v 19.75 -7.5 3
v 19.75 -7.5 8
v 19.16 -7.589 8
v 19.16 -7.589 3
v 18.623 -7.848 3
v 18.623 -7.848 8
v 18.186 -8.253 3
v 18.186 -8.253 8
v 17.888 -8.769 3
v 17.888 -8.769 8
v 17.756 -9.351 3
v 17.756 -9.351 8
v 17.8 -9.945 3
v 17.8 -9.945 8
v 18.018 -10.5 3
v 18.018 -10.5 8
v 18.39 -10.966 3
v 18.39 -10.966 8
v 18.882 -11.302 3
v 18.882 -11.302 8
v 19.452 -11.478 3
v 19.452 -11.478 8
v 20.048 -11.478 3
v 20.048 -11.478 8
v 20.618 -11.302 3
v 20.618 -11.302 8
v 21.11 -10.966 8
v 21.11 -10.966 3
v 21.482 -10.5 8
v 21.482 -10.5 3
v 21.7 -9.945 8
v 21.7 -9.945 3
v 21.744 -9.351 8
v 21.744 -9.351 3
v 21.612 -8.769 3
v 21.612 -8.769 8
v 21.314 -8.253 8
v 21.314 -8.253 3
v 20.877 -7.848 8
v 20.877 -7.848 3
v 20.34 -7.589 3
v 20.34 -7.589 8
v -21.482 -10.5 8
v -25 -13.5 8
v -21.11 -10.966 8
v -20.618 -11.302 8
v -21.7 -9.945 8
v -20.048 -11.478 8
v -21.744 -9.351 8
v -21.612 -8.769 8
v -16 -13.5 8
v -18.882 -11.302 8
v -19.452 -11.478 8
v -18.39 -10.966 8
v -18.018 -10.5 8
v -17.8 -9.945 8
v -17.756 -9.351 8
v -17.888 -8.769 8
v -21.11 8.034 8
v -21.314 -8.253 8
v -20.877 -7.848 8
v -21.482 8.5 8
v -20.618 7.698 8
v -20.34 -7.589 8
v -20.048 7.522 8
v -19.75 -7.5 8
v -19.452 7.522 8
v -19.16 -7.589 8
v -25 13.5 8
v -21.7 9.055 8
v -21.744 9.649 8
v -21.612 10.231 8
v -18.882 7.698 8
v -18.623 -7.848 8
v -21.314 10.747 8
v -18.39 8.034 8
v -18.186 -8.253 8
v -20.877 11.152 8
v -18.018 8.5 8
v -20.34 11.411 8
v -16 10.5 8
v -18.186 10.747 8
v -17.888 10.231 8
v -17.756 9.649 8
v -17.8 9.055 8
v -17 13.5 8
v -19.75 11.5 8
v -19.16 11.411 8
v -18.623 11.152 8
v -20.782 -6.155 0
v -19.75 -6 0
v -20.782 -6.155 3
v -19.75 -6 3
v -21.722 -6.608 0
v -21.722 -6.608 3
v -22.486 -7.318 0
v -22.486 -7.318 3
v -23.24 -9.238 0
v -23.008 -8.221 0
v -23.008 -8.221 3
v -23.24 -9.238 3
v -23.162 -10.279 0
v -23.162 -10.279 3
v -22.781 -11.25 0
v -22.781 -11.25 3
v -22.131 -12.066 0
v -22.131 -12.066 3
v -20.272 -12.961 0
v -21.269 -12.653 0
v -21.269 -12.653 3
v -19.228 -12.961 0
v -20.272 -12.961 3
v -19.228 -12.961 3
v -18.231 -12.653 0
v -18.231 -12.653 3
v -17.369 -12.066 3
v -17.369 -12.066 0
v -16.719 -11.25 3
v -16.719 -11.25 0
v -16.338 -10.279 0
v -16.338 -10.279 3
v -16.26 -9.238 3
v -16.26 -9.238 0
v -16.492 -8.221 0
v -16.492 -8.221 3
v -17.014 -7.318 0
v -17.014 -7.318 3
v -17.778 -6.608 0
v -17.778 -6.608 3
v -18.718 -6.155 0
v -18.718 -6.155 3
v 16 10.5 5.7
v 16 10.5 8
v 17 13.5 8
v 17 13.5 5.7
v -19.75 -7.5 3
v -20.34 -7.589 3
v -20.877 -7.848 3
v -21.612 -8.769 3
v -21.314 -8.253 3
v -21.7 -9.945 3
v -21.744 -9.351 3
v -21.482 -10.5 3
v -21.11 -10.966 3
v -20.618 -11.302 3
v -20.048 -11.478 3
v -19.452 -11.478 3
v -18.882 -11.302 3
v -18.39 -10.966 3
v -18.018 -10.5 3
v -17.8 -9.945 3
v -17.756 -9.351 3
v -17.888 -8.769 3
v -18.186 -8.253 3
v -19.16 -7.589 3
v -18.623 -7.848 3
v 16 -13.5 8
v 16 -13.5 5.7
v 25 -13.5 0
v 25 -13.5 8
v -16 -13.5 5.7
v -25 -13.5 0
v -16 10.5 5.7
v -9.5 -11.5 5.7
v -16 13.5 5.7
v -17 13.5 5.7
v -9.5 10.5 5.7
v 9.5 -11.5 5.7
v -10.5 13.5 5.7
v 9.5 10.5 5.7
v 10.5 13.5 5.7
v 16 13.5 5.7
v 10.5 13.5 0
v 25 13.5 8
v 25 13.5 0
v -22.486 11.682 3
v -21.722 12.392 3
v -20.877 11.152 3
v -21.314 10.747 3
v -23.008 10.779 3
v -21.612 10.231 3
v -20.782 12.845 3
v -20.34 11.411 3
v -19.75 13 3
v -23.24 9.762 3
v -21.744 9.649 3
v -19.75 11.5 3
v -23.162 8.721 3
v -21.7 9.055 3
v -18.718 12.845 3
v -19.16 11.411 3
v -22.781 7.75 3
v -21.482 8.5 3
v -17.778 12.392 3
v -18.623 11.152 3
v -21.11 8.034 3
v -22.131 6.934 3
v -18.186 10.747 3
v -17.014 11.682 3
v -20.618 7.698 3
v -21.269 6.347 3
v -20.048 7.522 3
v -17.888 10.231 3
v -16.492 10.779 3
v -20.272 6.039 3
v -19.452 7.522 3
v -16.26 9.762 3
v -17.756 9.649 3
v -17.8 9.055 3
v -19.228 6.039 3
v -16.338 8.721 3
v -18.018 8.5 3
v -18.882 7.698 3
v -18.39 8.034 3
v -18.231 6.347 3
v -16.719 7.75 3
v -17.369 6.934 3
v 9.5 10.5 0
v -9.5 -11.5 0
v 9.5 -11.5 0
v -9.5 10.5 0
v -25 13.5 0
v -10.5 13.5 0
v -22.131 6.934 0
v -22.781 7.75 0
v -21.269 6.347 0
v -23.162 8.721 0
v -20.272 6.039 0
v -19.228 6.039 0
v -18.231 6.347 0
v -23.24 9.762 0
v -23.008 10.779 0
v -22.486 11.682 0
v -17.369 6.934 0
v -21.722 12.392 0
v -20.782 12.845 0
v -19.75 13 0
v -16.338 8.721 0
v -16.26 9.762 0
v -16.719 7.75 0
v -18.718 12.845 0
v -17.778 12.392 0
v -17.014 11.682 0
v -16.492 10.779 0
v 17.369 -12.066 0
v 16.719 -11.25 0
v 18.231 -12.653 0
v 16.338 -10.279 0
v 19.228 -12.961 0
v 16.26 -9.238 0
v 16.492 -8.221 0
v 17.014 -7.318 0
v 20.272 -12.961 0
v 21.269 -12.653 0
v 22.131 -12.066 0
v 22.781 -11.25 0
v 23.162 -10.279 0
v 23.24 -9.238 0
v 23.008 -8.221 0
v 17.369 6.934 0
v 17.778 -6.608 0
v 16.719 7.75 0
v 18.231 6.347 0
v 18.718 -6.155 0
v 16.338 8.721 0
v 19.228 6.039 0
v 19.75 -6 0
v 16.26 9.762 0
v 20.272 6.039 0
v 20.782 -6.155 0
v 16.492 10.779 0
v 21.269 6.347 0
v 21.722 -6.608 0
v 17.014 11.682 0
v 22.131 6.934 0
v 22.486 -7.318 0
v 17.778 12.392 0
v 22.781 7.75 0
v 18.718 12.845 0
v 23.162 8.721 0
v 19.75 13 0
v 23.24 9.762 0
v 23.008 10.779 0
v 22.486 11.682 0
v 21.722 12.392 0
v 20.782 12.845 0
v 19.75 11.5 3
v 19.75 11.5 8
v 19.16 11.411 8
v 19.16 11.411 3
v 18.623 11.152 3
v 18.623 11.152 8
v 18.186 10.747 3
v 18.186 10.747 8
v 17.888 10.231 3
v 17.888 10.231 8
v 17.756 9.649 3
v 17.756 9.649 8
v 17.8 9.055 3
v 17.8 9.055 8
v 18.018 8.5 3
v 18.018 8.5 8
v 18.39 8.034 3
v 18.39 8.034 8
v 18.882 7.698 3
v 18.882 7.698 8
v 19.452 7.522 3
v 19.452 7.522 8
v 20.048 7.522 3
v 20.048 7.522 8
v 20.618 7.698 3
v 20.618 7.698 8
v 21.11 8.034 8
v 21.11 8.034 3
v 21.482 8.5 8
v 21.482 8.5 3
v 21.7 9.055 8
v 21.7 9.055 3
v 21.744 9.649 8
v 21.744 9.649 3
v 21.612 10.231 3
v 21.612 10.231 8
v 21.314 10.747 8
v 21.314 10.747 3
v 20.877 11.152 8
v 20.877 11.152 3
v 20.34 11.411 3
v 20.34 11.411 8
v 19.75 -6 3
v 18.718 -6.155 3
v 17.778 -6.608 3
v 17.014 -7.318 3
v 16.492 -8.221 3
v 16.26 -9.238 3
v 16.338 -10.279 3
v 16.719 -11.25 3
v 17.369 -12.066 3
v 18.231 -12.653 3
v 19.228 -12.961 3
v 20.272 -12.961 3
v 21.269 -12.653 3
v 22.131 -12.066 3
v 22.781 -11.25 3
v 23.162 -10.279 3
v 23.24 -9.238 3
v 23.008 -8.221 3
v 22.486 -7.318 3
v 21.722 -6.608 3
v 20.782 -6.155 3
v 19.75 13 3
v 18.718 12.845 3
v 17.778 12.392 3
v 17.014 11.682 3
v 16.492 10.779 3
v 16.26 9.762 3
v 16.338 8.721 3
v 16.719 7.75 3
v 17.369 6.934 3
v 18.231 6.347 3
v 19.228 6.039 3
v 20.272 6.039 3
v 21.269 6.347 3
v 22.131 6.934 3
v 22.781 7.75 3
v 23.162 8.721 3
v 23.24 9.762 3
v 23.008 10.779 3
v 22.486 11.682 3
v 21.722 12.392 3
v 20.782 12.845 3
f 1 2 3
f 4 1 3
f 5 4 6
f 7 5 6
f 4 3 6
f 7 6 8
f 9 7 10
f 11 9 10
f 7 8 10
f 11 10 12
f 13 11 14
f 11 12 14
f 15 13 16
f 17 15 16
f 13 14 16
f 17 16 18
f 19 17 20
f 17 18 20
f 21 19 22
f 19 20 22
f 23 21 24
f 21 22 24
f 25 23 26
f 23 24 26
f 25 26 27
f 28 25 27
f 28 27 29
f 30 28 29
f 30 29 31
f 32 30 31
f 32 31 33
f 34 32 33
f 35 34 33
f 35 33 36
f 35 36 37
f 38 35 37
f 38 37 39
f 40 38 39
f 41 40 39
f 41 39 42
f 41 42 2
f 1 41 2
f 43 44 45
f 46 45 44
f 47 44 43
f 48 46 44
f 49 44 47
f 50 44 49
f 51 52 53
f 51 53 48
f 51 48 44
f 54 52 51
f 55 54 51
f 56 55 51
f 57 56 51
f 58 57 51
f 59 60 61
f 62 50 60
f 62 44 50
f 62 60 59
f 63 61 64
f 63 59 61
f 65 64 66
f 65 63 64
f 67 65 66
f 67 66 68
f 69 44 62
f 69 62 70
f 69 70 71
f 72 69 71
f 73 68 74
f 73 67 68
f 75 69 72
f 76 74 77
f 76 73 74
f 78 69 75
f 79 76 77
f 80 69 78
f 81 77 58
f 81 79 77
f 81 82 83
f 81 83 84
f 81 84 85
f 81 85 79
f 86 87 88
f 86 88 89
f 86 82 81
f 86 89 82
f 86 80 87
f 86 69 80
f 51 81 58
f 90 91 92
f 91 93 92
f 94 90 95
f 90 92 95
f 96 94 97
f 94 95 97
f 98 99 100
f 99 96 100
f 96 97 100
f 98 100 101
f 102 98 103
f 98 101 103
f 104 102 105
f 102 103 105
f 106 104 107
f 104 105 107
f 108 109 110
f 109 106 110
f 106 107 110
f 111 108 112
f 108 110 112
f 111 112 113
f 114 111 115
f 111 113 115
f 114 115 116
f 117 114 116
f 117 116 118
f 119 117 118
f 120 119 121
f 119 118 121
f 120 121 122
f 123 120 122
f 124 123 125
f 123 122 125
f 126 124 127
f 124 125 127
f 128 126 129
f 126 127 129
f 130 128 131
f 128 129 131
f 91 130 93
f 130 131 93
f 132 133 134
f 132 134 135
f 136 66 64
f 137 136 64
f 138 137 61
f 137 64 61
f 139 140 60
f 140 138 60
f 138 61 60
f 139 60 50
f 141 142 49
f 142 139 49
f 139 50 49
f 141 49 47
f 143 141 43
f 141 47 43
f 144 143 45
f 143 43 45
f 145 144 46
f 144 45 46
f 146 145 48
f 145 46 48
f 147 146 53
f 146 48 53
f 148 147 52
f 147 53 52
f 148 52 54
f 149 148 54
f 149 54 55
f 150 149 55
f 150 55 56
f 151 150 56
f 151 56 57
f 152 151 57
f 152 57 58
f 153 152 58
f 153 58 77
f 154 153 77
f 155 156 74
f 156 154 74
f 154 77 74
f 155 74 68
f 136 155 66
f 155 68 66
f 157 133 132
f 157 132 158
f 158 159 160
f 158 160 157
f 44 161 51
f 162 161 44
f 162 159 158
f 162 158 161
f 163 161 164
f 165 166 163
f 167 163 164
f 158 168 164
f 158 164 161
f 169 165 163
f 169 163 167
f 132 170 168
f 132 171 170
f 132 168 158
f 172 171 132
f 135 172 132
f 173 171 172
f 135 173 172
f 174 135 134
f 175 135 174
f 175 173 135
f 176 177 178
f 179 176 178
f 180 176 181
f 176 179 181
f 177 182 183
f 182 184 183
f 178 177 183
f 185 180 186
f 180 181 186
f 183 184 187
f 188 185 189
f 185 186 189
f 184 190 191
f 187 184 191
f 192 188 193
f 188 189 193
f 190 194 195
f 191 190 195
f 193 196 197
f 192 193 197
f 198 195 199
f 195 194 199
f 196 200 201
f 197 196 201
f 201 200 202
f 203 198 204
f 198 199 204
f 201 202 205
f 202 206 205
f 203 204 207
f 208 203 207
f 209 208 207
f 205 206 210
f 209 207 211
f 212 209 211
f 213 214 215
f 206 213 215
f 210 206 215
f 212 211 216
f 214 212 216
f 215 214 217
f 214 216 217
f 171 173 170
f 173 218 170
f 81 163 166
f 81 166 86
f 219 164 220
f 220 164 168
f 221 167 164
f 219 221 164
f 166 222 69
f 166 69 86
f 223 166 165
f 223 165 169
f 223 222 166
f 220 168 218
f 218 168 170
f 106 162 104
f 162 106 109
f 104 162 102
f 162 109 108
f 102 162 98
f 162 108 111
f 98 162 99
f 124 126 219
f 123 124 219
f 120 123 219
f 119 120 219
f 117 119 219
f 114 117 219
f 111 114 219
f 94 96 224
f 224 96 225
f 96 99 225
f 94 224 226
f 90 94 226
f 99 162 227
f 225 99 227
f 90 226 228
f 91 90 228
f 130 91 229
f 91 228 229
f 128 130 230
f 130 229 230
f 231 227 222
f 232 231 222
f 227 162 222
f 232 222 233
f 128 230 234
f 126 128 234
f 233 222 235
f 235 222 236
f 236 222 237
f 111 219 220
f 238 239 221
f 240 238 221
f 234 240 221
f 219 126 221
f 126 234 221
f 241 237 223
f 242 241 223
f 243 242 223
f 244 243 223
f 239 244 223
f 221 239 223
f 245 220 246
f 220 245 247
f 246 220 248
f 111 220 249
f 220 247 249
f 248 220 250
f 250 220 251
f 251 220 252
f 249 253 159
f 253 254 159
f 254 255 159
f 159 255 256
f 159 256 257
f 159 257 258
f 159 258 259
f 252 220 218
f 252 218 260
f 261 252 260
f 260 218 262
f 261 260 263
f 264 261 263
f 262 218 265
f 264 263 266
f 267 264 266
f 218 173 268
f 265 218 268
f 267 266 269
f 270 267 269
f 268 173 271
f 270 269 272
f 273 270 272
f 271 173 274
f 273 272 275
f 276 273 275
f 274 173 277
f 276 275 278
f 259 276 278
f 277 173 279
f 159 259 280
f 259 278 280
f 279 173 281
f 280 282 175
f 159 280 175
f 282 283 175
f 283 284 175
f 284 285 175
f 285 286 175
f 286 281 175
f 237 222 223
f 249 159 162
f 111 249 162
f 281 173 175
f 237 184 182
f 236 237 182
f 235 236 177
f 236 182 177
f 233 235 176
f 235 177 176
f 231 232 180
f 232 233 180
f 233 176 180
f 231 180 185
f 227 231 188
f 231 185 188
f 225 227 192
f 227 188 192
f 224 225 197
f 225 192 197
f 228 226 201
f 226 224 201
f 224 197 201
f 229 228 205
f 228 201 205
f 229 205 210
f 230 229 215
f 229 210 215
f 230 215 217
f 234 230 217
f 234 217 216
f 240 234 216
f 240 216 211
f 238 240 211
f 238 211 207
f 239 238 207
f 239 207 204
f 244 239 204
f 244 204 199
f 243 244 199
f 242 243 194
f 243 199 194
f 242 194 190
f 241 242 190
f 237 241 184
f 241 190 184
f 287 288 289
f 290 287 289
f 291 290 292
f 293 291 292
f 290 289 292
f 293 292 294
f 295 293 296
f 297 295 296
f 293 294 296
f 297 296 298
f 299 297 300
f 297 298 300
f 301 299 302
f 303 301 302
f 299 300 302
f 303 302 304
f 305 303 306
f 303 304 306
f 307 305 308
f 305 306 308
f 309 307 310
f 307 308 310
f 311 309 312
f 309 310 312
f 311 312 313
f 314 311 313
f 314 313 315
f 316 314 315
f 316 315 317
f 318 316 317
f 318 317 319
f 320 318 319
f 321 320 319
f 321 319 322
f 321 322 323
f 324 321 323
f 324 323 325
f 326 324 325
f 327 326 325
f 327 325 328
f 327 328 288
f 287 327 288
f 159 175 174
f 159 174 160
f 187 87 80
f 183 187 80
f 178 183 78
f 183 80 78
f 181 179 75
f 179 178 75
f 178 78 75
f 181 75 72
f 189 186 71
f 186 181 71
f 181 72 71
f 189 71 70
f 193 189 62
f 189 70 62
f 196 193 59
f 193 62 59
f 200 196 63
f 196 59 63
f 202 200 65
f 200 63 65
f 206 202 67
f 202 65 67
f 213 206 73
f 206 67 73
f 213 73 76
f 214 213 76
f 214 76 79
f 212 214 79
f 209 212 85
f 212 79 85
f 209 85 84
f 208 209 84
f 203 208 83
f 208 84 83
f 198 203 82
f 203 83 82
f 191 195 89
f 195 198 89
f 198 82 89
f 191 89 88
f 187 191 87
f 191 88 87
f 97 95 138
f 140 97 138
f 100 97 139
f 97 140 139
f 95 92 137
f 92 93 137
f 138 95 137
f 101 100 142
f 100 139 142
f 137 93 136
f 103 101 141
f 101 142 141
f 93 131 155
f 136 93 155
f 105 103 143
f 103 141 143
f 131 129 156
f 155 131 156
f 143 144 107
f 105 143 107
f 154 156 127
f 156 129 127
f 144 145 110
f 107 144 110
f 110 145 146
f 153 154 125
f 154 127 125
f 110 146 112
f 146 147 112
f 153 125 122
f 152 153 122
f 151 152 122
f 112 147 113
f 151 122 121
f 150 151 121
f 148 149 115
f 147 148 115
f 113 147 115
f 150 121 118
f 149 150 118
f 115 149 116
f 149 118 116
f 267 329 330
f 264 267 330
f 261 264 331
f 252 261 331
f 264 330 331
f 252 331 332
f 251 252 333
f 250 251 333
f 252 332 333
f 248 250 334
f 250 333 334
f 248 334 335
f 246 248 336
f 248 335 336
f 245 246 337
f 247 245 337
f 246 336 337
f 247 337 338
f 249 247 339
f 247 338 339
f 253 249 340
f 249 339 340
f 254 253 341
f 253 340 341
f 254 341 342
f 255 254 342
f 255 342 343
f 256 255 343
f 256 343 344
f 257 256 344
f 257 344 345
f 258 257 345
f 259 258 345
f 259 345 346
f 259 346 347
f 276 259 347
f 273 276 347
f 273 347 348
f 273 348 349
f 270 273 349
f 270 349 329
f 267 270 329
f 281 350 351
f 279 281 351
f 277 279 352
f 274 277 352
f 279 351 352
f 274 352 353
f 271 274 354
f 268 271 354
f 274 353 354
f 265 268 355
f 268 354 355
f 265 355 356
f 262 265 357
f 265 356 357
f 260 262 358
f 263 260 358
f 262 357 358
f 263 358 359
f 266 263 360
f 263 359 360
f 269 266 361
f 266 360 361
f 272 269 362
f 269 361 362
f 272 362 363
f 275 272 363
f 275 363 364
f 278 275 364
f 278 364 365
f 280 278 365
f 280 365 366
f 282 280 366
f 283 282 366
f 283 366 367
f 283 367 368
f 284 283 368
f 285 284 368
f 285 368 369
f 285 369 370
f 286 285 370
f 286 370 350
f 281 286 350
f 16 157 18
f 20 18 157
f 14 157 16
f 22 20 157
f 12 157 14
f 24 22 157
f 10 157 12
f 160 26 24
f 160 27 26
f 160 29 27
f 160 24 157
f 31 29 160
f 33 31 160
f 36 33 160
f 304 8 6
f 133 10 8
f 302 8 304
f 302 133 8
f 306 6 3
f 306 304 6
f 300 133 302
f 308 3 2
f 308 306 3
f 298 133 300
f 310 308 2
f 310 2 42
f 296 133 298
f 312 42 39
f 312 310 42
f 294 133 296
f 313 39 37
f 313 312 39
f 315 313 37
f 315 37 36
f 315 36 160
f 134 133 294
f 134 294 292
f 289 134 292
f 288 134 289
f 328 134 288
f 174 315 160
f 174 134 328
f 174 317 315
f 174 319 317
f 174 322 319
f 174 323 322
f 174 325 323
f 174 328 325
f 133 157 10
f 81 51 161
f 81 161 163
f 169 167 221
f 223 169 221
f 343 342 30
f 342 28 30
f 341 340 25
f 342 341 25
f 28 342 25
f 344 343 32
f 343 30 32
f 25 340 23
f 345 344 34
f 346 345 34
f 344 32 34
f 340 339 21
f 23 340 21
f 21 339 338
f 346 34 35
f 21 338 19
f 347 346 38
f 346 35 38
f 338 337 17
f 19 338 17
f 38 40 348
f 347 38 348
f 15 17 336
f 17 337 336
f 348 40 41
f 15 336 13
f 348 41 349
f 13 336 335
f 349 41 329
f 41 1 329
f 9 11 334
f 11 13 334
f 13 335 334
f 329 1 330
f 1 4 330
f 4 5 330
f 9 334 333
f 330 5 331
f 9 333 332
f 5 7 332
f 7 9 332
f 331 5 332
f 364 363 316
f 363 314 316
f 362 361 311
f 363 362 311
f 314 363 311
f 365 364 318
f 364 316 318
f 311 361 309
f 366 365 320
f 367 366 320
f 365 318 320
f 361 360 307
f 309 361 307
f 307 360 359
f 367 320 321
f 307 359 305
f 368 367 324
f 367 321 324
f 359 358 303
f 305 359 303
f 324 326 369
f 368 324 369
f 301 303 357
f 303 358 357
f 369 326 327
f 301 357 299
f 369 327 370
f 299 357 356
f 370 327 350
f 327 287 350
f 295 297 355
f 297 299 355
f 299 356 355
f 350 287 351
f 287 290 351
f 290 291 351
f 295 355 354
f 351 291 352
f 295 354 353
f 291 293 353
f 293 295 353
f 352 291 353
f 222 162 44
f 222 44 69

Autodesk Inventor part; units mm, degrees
ref_plane "YZ Plane" through (0, 0, 0) normal (1, 0, 0) x (0, 1, 0)
ref_plane "XZ Plane" through (0, 0, 0) normal (0, 1, 0) x (-1, 0, 0)
ref_plane "XY Plane" through (0, 0, 0) normal (0, 0, 1) x (1, 0, 0)
sketch "Sketch1" plane through (0, 0, 0) normal (0, 0, 1) x (1, 0, 0)
  line L0 (-25, 13.5) -> (25, 13.5)
  line L1 (25, 13.5) -> (25, -13.5)
  line L2 (25, -13.5) -> (-25, -13.5)
  line L3 (-25, -13.5) -> (-25, 13.5)
  point P0 (0, 0)
  point P1 (0, 13.5)
  point P2 (-25, 0)
  dimension "d0" = 27
  dimension "d1" = 50
extrude "Extrusion1" add sketch "Sketch1" along normal blind 8
sketch "Sketch2" plane through (0, 0, 8) normal (0, 0, 1) x (1, 0, 0)
  arc A0 (-10.3042, 3.1624) -> (-9.6648, 2.3936) centre (-9.9845, 2.778) ccw
  line L0 (-1.0786, 10.8363) -> (-10.3042, 3.1624)
  arc A1 (-0.4391, 10.0675) -> (-1.0786, 10.8363) centre (-0.7589, 10.4519) ccw
  line L1 (-9.6648, 2.3936) -> (-0.4391, 10.0675)
  arc A2 (-9.156, -1.3455) -> (-8.5165, -2.1143) centre (-8.8363, -1.7299) ccw
  line L2 (3.1448, 8.8863) -> (-9.156, -1.3455)
  arc A3 (3.7843, 8.1175) -> (3.1448, 8.8863) centre (3.4646, 8.5019) ccw
  line L3 (-8.5165, -2.1143) -> (3.7843, 8.1175)
  arc A4 (-8.0078, -5.8535) -> (-7.3683, -6.6223) centre (-7.688, -6.2379) ccw
  line L4 (7.3683, 6.9363) -> (-8.0078, -5.8535)
  arc A5 (8.0078, 6.1675) -> (7.3683, 6.9363) centre (7.688, 6.5519) ccw
  line L5 (-7.3683, -6.6223) -> (8.0078, 6.1675)
  arc A6 (-3.7843, -7.8035) -> (-3.1448, -8.5723) centre (-3.4646, -8.1879) ccw
  line L6 (8.5165, 2.4283) -> (-3.7843, -7.8035)
  arc A7 (9.156, 1.6595) -> (8.5165, 2.4283) centre (8.8363, 2.0439) ccw
  line L7 (-3.1448, -8.5723) -> (9.156, 1.6595)
  arc A8 (0.4391, -9.7535) -> (1.0786, -10.5223) centre (0.7589, -10.1379) ccw
  line L8 (9.6648, -2.0796) -> (0.4391, -9.7535)
  arc A9 (10.3042, -2.8484) -> (9.6648, -2.0796) centre (9.9845, -2.464) ccw
  line L9 (1.0786, -10.5223) -> (10.3042, -2.8484)
  line L10 (9.5, 13.5) -> (-9.5, 13.5)
  line L11 (-9.5, 13.5) -> (-9.5, -11.5)
  line L12 (-9.5, -11.5) -> (9.5, -11.5)
  line L13 (9.5, -11.5) -> (9.5, 13.5)
  line L14 (-25, -13.5) -> (25, -13.5) projected
  line L15 (25, 13.5) -> (-25, 13.5) projected
  point P0 (0, 0)
  point P1 (0, -11.5)
  point P2 (0, -13.5)
  dimension "d4" = 19
  dimension "d5" = 2
extrude "Extrusion2" cut sketch "Sketch2" against normal through all contours L11 L10 L13 L8 A8 L9 L12 L1 A1 L0 | L0 A1 L1 L11 | L13 L9 A8 L8 | L2 A3 L3 A2 | L4 A5 L5 A4 | L6 A7 L7 A6
sketch "Sketch3" plane through (0, 0, 8) normal (0, 0, 1) x (1, 0, 0)
  line L0 (9.5, 13.5) -> (9.5, -11.5) projected
  line L1 (9.5, -11.5) -> (-9.5, -11.5) projected
  line L2 (-9.5, -11.5) -> (-9.5, 13.5) projected
  line L3 (9.5, 13.5) -> (16, 13.5)
  line L4 (25, 13.5) -> (9.5, 13.5) projected
  line L5 (16, 13.5) -> (16, -16.5)
  line L6 (16, -16.5) -> (-16, -16.5)
  line L7 (-16, -16.5) -> (-16, 13.5)
  line L8 (-9.5, 13.5) -> (-25, 13.5) projected
  circle A0 centre (0, 0.157) radius 12.5 projected
  point P0 (0, 0)
  dimension "d8" = 6.5
  dimension "d9" = 6.5
  dimension "d10" = 5
extrude "Extrusion3" cut sketch "Sketch3" against normal blind 2.3 contours L3 L5 L6 L7 L8 L2 A0 L1 L0 | A0 L0 | L2 A0 | A0 L1
sketch "Sketch4" plane through (0, 0, 0) normal (0, 0, -1) x (-1, 0, 0)
  line L0 (-25, -13.5) -> (-25, 13.5) projected
  line L1 (-25, 13.5) -> (-9.5, 13.5) projected
  line L2 (25, -13.5) -> (-25, -13.5) projected
  point P0 (0, 0)
  point P1 (-19.75, 9.5)
  point P2 (-19.75, -9.5)
  dimension "d13" = 5.25
  dimension "d14" = 4
  dimension "d15" = 4
hole "Hole1" at (19.75, 9.5, 0) at (19.75, -9.5, 0) direction (0, 0, 1) diameter 4 depth 8 tip angle 118 counterbore diameter 7 counterbore depth 3
mirror "Mirror1" about plane through (0, 0, 0) normal (1, 0, 0) of "Hole1"
chamfer "Chamfer1" distance 1 distance2 3 1 edges at (9.5, 13.5, 2.85) measured on face at (16.8333, 13.5, 1.9)
chamfer "Chamfer2" distance 1 distance2 3 1 edges at (16, 13.5, 6.85) measured on face at (17.1667, 13.5, 1.9)
chamfer "Chamfer3" distance 1 distance2 3 1 edges at (-9.5, 13.5, 2.85) measured on face at (-16.8333, 13.5, 1.9)
chamfer "Chamfer4" distance 1 distance2 3 1 edges at (-16, 13.5, 6.85) measured on face at (-17.1667, 13.5, 1.9)
equation "\"d9\" = d8"
properties part number "0008-10-003"
